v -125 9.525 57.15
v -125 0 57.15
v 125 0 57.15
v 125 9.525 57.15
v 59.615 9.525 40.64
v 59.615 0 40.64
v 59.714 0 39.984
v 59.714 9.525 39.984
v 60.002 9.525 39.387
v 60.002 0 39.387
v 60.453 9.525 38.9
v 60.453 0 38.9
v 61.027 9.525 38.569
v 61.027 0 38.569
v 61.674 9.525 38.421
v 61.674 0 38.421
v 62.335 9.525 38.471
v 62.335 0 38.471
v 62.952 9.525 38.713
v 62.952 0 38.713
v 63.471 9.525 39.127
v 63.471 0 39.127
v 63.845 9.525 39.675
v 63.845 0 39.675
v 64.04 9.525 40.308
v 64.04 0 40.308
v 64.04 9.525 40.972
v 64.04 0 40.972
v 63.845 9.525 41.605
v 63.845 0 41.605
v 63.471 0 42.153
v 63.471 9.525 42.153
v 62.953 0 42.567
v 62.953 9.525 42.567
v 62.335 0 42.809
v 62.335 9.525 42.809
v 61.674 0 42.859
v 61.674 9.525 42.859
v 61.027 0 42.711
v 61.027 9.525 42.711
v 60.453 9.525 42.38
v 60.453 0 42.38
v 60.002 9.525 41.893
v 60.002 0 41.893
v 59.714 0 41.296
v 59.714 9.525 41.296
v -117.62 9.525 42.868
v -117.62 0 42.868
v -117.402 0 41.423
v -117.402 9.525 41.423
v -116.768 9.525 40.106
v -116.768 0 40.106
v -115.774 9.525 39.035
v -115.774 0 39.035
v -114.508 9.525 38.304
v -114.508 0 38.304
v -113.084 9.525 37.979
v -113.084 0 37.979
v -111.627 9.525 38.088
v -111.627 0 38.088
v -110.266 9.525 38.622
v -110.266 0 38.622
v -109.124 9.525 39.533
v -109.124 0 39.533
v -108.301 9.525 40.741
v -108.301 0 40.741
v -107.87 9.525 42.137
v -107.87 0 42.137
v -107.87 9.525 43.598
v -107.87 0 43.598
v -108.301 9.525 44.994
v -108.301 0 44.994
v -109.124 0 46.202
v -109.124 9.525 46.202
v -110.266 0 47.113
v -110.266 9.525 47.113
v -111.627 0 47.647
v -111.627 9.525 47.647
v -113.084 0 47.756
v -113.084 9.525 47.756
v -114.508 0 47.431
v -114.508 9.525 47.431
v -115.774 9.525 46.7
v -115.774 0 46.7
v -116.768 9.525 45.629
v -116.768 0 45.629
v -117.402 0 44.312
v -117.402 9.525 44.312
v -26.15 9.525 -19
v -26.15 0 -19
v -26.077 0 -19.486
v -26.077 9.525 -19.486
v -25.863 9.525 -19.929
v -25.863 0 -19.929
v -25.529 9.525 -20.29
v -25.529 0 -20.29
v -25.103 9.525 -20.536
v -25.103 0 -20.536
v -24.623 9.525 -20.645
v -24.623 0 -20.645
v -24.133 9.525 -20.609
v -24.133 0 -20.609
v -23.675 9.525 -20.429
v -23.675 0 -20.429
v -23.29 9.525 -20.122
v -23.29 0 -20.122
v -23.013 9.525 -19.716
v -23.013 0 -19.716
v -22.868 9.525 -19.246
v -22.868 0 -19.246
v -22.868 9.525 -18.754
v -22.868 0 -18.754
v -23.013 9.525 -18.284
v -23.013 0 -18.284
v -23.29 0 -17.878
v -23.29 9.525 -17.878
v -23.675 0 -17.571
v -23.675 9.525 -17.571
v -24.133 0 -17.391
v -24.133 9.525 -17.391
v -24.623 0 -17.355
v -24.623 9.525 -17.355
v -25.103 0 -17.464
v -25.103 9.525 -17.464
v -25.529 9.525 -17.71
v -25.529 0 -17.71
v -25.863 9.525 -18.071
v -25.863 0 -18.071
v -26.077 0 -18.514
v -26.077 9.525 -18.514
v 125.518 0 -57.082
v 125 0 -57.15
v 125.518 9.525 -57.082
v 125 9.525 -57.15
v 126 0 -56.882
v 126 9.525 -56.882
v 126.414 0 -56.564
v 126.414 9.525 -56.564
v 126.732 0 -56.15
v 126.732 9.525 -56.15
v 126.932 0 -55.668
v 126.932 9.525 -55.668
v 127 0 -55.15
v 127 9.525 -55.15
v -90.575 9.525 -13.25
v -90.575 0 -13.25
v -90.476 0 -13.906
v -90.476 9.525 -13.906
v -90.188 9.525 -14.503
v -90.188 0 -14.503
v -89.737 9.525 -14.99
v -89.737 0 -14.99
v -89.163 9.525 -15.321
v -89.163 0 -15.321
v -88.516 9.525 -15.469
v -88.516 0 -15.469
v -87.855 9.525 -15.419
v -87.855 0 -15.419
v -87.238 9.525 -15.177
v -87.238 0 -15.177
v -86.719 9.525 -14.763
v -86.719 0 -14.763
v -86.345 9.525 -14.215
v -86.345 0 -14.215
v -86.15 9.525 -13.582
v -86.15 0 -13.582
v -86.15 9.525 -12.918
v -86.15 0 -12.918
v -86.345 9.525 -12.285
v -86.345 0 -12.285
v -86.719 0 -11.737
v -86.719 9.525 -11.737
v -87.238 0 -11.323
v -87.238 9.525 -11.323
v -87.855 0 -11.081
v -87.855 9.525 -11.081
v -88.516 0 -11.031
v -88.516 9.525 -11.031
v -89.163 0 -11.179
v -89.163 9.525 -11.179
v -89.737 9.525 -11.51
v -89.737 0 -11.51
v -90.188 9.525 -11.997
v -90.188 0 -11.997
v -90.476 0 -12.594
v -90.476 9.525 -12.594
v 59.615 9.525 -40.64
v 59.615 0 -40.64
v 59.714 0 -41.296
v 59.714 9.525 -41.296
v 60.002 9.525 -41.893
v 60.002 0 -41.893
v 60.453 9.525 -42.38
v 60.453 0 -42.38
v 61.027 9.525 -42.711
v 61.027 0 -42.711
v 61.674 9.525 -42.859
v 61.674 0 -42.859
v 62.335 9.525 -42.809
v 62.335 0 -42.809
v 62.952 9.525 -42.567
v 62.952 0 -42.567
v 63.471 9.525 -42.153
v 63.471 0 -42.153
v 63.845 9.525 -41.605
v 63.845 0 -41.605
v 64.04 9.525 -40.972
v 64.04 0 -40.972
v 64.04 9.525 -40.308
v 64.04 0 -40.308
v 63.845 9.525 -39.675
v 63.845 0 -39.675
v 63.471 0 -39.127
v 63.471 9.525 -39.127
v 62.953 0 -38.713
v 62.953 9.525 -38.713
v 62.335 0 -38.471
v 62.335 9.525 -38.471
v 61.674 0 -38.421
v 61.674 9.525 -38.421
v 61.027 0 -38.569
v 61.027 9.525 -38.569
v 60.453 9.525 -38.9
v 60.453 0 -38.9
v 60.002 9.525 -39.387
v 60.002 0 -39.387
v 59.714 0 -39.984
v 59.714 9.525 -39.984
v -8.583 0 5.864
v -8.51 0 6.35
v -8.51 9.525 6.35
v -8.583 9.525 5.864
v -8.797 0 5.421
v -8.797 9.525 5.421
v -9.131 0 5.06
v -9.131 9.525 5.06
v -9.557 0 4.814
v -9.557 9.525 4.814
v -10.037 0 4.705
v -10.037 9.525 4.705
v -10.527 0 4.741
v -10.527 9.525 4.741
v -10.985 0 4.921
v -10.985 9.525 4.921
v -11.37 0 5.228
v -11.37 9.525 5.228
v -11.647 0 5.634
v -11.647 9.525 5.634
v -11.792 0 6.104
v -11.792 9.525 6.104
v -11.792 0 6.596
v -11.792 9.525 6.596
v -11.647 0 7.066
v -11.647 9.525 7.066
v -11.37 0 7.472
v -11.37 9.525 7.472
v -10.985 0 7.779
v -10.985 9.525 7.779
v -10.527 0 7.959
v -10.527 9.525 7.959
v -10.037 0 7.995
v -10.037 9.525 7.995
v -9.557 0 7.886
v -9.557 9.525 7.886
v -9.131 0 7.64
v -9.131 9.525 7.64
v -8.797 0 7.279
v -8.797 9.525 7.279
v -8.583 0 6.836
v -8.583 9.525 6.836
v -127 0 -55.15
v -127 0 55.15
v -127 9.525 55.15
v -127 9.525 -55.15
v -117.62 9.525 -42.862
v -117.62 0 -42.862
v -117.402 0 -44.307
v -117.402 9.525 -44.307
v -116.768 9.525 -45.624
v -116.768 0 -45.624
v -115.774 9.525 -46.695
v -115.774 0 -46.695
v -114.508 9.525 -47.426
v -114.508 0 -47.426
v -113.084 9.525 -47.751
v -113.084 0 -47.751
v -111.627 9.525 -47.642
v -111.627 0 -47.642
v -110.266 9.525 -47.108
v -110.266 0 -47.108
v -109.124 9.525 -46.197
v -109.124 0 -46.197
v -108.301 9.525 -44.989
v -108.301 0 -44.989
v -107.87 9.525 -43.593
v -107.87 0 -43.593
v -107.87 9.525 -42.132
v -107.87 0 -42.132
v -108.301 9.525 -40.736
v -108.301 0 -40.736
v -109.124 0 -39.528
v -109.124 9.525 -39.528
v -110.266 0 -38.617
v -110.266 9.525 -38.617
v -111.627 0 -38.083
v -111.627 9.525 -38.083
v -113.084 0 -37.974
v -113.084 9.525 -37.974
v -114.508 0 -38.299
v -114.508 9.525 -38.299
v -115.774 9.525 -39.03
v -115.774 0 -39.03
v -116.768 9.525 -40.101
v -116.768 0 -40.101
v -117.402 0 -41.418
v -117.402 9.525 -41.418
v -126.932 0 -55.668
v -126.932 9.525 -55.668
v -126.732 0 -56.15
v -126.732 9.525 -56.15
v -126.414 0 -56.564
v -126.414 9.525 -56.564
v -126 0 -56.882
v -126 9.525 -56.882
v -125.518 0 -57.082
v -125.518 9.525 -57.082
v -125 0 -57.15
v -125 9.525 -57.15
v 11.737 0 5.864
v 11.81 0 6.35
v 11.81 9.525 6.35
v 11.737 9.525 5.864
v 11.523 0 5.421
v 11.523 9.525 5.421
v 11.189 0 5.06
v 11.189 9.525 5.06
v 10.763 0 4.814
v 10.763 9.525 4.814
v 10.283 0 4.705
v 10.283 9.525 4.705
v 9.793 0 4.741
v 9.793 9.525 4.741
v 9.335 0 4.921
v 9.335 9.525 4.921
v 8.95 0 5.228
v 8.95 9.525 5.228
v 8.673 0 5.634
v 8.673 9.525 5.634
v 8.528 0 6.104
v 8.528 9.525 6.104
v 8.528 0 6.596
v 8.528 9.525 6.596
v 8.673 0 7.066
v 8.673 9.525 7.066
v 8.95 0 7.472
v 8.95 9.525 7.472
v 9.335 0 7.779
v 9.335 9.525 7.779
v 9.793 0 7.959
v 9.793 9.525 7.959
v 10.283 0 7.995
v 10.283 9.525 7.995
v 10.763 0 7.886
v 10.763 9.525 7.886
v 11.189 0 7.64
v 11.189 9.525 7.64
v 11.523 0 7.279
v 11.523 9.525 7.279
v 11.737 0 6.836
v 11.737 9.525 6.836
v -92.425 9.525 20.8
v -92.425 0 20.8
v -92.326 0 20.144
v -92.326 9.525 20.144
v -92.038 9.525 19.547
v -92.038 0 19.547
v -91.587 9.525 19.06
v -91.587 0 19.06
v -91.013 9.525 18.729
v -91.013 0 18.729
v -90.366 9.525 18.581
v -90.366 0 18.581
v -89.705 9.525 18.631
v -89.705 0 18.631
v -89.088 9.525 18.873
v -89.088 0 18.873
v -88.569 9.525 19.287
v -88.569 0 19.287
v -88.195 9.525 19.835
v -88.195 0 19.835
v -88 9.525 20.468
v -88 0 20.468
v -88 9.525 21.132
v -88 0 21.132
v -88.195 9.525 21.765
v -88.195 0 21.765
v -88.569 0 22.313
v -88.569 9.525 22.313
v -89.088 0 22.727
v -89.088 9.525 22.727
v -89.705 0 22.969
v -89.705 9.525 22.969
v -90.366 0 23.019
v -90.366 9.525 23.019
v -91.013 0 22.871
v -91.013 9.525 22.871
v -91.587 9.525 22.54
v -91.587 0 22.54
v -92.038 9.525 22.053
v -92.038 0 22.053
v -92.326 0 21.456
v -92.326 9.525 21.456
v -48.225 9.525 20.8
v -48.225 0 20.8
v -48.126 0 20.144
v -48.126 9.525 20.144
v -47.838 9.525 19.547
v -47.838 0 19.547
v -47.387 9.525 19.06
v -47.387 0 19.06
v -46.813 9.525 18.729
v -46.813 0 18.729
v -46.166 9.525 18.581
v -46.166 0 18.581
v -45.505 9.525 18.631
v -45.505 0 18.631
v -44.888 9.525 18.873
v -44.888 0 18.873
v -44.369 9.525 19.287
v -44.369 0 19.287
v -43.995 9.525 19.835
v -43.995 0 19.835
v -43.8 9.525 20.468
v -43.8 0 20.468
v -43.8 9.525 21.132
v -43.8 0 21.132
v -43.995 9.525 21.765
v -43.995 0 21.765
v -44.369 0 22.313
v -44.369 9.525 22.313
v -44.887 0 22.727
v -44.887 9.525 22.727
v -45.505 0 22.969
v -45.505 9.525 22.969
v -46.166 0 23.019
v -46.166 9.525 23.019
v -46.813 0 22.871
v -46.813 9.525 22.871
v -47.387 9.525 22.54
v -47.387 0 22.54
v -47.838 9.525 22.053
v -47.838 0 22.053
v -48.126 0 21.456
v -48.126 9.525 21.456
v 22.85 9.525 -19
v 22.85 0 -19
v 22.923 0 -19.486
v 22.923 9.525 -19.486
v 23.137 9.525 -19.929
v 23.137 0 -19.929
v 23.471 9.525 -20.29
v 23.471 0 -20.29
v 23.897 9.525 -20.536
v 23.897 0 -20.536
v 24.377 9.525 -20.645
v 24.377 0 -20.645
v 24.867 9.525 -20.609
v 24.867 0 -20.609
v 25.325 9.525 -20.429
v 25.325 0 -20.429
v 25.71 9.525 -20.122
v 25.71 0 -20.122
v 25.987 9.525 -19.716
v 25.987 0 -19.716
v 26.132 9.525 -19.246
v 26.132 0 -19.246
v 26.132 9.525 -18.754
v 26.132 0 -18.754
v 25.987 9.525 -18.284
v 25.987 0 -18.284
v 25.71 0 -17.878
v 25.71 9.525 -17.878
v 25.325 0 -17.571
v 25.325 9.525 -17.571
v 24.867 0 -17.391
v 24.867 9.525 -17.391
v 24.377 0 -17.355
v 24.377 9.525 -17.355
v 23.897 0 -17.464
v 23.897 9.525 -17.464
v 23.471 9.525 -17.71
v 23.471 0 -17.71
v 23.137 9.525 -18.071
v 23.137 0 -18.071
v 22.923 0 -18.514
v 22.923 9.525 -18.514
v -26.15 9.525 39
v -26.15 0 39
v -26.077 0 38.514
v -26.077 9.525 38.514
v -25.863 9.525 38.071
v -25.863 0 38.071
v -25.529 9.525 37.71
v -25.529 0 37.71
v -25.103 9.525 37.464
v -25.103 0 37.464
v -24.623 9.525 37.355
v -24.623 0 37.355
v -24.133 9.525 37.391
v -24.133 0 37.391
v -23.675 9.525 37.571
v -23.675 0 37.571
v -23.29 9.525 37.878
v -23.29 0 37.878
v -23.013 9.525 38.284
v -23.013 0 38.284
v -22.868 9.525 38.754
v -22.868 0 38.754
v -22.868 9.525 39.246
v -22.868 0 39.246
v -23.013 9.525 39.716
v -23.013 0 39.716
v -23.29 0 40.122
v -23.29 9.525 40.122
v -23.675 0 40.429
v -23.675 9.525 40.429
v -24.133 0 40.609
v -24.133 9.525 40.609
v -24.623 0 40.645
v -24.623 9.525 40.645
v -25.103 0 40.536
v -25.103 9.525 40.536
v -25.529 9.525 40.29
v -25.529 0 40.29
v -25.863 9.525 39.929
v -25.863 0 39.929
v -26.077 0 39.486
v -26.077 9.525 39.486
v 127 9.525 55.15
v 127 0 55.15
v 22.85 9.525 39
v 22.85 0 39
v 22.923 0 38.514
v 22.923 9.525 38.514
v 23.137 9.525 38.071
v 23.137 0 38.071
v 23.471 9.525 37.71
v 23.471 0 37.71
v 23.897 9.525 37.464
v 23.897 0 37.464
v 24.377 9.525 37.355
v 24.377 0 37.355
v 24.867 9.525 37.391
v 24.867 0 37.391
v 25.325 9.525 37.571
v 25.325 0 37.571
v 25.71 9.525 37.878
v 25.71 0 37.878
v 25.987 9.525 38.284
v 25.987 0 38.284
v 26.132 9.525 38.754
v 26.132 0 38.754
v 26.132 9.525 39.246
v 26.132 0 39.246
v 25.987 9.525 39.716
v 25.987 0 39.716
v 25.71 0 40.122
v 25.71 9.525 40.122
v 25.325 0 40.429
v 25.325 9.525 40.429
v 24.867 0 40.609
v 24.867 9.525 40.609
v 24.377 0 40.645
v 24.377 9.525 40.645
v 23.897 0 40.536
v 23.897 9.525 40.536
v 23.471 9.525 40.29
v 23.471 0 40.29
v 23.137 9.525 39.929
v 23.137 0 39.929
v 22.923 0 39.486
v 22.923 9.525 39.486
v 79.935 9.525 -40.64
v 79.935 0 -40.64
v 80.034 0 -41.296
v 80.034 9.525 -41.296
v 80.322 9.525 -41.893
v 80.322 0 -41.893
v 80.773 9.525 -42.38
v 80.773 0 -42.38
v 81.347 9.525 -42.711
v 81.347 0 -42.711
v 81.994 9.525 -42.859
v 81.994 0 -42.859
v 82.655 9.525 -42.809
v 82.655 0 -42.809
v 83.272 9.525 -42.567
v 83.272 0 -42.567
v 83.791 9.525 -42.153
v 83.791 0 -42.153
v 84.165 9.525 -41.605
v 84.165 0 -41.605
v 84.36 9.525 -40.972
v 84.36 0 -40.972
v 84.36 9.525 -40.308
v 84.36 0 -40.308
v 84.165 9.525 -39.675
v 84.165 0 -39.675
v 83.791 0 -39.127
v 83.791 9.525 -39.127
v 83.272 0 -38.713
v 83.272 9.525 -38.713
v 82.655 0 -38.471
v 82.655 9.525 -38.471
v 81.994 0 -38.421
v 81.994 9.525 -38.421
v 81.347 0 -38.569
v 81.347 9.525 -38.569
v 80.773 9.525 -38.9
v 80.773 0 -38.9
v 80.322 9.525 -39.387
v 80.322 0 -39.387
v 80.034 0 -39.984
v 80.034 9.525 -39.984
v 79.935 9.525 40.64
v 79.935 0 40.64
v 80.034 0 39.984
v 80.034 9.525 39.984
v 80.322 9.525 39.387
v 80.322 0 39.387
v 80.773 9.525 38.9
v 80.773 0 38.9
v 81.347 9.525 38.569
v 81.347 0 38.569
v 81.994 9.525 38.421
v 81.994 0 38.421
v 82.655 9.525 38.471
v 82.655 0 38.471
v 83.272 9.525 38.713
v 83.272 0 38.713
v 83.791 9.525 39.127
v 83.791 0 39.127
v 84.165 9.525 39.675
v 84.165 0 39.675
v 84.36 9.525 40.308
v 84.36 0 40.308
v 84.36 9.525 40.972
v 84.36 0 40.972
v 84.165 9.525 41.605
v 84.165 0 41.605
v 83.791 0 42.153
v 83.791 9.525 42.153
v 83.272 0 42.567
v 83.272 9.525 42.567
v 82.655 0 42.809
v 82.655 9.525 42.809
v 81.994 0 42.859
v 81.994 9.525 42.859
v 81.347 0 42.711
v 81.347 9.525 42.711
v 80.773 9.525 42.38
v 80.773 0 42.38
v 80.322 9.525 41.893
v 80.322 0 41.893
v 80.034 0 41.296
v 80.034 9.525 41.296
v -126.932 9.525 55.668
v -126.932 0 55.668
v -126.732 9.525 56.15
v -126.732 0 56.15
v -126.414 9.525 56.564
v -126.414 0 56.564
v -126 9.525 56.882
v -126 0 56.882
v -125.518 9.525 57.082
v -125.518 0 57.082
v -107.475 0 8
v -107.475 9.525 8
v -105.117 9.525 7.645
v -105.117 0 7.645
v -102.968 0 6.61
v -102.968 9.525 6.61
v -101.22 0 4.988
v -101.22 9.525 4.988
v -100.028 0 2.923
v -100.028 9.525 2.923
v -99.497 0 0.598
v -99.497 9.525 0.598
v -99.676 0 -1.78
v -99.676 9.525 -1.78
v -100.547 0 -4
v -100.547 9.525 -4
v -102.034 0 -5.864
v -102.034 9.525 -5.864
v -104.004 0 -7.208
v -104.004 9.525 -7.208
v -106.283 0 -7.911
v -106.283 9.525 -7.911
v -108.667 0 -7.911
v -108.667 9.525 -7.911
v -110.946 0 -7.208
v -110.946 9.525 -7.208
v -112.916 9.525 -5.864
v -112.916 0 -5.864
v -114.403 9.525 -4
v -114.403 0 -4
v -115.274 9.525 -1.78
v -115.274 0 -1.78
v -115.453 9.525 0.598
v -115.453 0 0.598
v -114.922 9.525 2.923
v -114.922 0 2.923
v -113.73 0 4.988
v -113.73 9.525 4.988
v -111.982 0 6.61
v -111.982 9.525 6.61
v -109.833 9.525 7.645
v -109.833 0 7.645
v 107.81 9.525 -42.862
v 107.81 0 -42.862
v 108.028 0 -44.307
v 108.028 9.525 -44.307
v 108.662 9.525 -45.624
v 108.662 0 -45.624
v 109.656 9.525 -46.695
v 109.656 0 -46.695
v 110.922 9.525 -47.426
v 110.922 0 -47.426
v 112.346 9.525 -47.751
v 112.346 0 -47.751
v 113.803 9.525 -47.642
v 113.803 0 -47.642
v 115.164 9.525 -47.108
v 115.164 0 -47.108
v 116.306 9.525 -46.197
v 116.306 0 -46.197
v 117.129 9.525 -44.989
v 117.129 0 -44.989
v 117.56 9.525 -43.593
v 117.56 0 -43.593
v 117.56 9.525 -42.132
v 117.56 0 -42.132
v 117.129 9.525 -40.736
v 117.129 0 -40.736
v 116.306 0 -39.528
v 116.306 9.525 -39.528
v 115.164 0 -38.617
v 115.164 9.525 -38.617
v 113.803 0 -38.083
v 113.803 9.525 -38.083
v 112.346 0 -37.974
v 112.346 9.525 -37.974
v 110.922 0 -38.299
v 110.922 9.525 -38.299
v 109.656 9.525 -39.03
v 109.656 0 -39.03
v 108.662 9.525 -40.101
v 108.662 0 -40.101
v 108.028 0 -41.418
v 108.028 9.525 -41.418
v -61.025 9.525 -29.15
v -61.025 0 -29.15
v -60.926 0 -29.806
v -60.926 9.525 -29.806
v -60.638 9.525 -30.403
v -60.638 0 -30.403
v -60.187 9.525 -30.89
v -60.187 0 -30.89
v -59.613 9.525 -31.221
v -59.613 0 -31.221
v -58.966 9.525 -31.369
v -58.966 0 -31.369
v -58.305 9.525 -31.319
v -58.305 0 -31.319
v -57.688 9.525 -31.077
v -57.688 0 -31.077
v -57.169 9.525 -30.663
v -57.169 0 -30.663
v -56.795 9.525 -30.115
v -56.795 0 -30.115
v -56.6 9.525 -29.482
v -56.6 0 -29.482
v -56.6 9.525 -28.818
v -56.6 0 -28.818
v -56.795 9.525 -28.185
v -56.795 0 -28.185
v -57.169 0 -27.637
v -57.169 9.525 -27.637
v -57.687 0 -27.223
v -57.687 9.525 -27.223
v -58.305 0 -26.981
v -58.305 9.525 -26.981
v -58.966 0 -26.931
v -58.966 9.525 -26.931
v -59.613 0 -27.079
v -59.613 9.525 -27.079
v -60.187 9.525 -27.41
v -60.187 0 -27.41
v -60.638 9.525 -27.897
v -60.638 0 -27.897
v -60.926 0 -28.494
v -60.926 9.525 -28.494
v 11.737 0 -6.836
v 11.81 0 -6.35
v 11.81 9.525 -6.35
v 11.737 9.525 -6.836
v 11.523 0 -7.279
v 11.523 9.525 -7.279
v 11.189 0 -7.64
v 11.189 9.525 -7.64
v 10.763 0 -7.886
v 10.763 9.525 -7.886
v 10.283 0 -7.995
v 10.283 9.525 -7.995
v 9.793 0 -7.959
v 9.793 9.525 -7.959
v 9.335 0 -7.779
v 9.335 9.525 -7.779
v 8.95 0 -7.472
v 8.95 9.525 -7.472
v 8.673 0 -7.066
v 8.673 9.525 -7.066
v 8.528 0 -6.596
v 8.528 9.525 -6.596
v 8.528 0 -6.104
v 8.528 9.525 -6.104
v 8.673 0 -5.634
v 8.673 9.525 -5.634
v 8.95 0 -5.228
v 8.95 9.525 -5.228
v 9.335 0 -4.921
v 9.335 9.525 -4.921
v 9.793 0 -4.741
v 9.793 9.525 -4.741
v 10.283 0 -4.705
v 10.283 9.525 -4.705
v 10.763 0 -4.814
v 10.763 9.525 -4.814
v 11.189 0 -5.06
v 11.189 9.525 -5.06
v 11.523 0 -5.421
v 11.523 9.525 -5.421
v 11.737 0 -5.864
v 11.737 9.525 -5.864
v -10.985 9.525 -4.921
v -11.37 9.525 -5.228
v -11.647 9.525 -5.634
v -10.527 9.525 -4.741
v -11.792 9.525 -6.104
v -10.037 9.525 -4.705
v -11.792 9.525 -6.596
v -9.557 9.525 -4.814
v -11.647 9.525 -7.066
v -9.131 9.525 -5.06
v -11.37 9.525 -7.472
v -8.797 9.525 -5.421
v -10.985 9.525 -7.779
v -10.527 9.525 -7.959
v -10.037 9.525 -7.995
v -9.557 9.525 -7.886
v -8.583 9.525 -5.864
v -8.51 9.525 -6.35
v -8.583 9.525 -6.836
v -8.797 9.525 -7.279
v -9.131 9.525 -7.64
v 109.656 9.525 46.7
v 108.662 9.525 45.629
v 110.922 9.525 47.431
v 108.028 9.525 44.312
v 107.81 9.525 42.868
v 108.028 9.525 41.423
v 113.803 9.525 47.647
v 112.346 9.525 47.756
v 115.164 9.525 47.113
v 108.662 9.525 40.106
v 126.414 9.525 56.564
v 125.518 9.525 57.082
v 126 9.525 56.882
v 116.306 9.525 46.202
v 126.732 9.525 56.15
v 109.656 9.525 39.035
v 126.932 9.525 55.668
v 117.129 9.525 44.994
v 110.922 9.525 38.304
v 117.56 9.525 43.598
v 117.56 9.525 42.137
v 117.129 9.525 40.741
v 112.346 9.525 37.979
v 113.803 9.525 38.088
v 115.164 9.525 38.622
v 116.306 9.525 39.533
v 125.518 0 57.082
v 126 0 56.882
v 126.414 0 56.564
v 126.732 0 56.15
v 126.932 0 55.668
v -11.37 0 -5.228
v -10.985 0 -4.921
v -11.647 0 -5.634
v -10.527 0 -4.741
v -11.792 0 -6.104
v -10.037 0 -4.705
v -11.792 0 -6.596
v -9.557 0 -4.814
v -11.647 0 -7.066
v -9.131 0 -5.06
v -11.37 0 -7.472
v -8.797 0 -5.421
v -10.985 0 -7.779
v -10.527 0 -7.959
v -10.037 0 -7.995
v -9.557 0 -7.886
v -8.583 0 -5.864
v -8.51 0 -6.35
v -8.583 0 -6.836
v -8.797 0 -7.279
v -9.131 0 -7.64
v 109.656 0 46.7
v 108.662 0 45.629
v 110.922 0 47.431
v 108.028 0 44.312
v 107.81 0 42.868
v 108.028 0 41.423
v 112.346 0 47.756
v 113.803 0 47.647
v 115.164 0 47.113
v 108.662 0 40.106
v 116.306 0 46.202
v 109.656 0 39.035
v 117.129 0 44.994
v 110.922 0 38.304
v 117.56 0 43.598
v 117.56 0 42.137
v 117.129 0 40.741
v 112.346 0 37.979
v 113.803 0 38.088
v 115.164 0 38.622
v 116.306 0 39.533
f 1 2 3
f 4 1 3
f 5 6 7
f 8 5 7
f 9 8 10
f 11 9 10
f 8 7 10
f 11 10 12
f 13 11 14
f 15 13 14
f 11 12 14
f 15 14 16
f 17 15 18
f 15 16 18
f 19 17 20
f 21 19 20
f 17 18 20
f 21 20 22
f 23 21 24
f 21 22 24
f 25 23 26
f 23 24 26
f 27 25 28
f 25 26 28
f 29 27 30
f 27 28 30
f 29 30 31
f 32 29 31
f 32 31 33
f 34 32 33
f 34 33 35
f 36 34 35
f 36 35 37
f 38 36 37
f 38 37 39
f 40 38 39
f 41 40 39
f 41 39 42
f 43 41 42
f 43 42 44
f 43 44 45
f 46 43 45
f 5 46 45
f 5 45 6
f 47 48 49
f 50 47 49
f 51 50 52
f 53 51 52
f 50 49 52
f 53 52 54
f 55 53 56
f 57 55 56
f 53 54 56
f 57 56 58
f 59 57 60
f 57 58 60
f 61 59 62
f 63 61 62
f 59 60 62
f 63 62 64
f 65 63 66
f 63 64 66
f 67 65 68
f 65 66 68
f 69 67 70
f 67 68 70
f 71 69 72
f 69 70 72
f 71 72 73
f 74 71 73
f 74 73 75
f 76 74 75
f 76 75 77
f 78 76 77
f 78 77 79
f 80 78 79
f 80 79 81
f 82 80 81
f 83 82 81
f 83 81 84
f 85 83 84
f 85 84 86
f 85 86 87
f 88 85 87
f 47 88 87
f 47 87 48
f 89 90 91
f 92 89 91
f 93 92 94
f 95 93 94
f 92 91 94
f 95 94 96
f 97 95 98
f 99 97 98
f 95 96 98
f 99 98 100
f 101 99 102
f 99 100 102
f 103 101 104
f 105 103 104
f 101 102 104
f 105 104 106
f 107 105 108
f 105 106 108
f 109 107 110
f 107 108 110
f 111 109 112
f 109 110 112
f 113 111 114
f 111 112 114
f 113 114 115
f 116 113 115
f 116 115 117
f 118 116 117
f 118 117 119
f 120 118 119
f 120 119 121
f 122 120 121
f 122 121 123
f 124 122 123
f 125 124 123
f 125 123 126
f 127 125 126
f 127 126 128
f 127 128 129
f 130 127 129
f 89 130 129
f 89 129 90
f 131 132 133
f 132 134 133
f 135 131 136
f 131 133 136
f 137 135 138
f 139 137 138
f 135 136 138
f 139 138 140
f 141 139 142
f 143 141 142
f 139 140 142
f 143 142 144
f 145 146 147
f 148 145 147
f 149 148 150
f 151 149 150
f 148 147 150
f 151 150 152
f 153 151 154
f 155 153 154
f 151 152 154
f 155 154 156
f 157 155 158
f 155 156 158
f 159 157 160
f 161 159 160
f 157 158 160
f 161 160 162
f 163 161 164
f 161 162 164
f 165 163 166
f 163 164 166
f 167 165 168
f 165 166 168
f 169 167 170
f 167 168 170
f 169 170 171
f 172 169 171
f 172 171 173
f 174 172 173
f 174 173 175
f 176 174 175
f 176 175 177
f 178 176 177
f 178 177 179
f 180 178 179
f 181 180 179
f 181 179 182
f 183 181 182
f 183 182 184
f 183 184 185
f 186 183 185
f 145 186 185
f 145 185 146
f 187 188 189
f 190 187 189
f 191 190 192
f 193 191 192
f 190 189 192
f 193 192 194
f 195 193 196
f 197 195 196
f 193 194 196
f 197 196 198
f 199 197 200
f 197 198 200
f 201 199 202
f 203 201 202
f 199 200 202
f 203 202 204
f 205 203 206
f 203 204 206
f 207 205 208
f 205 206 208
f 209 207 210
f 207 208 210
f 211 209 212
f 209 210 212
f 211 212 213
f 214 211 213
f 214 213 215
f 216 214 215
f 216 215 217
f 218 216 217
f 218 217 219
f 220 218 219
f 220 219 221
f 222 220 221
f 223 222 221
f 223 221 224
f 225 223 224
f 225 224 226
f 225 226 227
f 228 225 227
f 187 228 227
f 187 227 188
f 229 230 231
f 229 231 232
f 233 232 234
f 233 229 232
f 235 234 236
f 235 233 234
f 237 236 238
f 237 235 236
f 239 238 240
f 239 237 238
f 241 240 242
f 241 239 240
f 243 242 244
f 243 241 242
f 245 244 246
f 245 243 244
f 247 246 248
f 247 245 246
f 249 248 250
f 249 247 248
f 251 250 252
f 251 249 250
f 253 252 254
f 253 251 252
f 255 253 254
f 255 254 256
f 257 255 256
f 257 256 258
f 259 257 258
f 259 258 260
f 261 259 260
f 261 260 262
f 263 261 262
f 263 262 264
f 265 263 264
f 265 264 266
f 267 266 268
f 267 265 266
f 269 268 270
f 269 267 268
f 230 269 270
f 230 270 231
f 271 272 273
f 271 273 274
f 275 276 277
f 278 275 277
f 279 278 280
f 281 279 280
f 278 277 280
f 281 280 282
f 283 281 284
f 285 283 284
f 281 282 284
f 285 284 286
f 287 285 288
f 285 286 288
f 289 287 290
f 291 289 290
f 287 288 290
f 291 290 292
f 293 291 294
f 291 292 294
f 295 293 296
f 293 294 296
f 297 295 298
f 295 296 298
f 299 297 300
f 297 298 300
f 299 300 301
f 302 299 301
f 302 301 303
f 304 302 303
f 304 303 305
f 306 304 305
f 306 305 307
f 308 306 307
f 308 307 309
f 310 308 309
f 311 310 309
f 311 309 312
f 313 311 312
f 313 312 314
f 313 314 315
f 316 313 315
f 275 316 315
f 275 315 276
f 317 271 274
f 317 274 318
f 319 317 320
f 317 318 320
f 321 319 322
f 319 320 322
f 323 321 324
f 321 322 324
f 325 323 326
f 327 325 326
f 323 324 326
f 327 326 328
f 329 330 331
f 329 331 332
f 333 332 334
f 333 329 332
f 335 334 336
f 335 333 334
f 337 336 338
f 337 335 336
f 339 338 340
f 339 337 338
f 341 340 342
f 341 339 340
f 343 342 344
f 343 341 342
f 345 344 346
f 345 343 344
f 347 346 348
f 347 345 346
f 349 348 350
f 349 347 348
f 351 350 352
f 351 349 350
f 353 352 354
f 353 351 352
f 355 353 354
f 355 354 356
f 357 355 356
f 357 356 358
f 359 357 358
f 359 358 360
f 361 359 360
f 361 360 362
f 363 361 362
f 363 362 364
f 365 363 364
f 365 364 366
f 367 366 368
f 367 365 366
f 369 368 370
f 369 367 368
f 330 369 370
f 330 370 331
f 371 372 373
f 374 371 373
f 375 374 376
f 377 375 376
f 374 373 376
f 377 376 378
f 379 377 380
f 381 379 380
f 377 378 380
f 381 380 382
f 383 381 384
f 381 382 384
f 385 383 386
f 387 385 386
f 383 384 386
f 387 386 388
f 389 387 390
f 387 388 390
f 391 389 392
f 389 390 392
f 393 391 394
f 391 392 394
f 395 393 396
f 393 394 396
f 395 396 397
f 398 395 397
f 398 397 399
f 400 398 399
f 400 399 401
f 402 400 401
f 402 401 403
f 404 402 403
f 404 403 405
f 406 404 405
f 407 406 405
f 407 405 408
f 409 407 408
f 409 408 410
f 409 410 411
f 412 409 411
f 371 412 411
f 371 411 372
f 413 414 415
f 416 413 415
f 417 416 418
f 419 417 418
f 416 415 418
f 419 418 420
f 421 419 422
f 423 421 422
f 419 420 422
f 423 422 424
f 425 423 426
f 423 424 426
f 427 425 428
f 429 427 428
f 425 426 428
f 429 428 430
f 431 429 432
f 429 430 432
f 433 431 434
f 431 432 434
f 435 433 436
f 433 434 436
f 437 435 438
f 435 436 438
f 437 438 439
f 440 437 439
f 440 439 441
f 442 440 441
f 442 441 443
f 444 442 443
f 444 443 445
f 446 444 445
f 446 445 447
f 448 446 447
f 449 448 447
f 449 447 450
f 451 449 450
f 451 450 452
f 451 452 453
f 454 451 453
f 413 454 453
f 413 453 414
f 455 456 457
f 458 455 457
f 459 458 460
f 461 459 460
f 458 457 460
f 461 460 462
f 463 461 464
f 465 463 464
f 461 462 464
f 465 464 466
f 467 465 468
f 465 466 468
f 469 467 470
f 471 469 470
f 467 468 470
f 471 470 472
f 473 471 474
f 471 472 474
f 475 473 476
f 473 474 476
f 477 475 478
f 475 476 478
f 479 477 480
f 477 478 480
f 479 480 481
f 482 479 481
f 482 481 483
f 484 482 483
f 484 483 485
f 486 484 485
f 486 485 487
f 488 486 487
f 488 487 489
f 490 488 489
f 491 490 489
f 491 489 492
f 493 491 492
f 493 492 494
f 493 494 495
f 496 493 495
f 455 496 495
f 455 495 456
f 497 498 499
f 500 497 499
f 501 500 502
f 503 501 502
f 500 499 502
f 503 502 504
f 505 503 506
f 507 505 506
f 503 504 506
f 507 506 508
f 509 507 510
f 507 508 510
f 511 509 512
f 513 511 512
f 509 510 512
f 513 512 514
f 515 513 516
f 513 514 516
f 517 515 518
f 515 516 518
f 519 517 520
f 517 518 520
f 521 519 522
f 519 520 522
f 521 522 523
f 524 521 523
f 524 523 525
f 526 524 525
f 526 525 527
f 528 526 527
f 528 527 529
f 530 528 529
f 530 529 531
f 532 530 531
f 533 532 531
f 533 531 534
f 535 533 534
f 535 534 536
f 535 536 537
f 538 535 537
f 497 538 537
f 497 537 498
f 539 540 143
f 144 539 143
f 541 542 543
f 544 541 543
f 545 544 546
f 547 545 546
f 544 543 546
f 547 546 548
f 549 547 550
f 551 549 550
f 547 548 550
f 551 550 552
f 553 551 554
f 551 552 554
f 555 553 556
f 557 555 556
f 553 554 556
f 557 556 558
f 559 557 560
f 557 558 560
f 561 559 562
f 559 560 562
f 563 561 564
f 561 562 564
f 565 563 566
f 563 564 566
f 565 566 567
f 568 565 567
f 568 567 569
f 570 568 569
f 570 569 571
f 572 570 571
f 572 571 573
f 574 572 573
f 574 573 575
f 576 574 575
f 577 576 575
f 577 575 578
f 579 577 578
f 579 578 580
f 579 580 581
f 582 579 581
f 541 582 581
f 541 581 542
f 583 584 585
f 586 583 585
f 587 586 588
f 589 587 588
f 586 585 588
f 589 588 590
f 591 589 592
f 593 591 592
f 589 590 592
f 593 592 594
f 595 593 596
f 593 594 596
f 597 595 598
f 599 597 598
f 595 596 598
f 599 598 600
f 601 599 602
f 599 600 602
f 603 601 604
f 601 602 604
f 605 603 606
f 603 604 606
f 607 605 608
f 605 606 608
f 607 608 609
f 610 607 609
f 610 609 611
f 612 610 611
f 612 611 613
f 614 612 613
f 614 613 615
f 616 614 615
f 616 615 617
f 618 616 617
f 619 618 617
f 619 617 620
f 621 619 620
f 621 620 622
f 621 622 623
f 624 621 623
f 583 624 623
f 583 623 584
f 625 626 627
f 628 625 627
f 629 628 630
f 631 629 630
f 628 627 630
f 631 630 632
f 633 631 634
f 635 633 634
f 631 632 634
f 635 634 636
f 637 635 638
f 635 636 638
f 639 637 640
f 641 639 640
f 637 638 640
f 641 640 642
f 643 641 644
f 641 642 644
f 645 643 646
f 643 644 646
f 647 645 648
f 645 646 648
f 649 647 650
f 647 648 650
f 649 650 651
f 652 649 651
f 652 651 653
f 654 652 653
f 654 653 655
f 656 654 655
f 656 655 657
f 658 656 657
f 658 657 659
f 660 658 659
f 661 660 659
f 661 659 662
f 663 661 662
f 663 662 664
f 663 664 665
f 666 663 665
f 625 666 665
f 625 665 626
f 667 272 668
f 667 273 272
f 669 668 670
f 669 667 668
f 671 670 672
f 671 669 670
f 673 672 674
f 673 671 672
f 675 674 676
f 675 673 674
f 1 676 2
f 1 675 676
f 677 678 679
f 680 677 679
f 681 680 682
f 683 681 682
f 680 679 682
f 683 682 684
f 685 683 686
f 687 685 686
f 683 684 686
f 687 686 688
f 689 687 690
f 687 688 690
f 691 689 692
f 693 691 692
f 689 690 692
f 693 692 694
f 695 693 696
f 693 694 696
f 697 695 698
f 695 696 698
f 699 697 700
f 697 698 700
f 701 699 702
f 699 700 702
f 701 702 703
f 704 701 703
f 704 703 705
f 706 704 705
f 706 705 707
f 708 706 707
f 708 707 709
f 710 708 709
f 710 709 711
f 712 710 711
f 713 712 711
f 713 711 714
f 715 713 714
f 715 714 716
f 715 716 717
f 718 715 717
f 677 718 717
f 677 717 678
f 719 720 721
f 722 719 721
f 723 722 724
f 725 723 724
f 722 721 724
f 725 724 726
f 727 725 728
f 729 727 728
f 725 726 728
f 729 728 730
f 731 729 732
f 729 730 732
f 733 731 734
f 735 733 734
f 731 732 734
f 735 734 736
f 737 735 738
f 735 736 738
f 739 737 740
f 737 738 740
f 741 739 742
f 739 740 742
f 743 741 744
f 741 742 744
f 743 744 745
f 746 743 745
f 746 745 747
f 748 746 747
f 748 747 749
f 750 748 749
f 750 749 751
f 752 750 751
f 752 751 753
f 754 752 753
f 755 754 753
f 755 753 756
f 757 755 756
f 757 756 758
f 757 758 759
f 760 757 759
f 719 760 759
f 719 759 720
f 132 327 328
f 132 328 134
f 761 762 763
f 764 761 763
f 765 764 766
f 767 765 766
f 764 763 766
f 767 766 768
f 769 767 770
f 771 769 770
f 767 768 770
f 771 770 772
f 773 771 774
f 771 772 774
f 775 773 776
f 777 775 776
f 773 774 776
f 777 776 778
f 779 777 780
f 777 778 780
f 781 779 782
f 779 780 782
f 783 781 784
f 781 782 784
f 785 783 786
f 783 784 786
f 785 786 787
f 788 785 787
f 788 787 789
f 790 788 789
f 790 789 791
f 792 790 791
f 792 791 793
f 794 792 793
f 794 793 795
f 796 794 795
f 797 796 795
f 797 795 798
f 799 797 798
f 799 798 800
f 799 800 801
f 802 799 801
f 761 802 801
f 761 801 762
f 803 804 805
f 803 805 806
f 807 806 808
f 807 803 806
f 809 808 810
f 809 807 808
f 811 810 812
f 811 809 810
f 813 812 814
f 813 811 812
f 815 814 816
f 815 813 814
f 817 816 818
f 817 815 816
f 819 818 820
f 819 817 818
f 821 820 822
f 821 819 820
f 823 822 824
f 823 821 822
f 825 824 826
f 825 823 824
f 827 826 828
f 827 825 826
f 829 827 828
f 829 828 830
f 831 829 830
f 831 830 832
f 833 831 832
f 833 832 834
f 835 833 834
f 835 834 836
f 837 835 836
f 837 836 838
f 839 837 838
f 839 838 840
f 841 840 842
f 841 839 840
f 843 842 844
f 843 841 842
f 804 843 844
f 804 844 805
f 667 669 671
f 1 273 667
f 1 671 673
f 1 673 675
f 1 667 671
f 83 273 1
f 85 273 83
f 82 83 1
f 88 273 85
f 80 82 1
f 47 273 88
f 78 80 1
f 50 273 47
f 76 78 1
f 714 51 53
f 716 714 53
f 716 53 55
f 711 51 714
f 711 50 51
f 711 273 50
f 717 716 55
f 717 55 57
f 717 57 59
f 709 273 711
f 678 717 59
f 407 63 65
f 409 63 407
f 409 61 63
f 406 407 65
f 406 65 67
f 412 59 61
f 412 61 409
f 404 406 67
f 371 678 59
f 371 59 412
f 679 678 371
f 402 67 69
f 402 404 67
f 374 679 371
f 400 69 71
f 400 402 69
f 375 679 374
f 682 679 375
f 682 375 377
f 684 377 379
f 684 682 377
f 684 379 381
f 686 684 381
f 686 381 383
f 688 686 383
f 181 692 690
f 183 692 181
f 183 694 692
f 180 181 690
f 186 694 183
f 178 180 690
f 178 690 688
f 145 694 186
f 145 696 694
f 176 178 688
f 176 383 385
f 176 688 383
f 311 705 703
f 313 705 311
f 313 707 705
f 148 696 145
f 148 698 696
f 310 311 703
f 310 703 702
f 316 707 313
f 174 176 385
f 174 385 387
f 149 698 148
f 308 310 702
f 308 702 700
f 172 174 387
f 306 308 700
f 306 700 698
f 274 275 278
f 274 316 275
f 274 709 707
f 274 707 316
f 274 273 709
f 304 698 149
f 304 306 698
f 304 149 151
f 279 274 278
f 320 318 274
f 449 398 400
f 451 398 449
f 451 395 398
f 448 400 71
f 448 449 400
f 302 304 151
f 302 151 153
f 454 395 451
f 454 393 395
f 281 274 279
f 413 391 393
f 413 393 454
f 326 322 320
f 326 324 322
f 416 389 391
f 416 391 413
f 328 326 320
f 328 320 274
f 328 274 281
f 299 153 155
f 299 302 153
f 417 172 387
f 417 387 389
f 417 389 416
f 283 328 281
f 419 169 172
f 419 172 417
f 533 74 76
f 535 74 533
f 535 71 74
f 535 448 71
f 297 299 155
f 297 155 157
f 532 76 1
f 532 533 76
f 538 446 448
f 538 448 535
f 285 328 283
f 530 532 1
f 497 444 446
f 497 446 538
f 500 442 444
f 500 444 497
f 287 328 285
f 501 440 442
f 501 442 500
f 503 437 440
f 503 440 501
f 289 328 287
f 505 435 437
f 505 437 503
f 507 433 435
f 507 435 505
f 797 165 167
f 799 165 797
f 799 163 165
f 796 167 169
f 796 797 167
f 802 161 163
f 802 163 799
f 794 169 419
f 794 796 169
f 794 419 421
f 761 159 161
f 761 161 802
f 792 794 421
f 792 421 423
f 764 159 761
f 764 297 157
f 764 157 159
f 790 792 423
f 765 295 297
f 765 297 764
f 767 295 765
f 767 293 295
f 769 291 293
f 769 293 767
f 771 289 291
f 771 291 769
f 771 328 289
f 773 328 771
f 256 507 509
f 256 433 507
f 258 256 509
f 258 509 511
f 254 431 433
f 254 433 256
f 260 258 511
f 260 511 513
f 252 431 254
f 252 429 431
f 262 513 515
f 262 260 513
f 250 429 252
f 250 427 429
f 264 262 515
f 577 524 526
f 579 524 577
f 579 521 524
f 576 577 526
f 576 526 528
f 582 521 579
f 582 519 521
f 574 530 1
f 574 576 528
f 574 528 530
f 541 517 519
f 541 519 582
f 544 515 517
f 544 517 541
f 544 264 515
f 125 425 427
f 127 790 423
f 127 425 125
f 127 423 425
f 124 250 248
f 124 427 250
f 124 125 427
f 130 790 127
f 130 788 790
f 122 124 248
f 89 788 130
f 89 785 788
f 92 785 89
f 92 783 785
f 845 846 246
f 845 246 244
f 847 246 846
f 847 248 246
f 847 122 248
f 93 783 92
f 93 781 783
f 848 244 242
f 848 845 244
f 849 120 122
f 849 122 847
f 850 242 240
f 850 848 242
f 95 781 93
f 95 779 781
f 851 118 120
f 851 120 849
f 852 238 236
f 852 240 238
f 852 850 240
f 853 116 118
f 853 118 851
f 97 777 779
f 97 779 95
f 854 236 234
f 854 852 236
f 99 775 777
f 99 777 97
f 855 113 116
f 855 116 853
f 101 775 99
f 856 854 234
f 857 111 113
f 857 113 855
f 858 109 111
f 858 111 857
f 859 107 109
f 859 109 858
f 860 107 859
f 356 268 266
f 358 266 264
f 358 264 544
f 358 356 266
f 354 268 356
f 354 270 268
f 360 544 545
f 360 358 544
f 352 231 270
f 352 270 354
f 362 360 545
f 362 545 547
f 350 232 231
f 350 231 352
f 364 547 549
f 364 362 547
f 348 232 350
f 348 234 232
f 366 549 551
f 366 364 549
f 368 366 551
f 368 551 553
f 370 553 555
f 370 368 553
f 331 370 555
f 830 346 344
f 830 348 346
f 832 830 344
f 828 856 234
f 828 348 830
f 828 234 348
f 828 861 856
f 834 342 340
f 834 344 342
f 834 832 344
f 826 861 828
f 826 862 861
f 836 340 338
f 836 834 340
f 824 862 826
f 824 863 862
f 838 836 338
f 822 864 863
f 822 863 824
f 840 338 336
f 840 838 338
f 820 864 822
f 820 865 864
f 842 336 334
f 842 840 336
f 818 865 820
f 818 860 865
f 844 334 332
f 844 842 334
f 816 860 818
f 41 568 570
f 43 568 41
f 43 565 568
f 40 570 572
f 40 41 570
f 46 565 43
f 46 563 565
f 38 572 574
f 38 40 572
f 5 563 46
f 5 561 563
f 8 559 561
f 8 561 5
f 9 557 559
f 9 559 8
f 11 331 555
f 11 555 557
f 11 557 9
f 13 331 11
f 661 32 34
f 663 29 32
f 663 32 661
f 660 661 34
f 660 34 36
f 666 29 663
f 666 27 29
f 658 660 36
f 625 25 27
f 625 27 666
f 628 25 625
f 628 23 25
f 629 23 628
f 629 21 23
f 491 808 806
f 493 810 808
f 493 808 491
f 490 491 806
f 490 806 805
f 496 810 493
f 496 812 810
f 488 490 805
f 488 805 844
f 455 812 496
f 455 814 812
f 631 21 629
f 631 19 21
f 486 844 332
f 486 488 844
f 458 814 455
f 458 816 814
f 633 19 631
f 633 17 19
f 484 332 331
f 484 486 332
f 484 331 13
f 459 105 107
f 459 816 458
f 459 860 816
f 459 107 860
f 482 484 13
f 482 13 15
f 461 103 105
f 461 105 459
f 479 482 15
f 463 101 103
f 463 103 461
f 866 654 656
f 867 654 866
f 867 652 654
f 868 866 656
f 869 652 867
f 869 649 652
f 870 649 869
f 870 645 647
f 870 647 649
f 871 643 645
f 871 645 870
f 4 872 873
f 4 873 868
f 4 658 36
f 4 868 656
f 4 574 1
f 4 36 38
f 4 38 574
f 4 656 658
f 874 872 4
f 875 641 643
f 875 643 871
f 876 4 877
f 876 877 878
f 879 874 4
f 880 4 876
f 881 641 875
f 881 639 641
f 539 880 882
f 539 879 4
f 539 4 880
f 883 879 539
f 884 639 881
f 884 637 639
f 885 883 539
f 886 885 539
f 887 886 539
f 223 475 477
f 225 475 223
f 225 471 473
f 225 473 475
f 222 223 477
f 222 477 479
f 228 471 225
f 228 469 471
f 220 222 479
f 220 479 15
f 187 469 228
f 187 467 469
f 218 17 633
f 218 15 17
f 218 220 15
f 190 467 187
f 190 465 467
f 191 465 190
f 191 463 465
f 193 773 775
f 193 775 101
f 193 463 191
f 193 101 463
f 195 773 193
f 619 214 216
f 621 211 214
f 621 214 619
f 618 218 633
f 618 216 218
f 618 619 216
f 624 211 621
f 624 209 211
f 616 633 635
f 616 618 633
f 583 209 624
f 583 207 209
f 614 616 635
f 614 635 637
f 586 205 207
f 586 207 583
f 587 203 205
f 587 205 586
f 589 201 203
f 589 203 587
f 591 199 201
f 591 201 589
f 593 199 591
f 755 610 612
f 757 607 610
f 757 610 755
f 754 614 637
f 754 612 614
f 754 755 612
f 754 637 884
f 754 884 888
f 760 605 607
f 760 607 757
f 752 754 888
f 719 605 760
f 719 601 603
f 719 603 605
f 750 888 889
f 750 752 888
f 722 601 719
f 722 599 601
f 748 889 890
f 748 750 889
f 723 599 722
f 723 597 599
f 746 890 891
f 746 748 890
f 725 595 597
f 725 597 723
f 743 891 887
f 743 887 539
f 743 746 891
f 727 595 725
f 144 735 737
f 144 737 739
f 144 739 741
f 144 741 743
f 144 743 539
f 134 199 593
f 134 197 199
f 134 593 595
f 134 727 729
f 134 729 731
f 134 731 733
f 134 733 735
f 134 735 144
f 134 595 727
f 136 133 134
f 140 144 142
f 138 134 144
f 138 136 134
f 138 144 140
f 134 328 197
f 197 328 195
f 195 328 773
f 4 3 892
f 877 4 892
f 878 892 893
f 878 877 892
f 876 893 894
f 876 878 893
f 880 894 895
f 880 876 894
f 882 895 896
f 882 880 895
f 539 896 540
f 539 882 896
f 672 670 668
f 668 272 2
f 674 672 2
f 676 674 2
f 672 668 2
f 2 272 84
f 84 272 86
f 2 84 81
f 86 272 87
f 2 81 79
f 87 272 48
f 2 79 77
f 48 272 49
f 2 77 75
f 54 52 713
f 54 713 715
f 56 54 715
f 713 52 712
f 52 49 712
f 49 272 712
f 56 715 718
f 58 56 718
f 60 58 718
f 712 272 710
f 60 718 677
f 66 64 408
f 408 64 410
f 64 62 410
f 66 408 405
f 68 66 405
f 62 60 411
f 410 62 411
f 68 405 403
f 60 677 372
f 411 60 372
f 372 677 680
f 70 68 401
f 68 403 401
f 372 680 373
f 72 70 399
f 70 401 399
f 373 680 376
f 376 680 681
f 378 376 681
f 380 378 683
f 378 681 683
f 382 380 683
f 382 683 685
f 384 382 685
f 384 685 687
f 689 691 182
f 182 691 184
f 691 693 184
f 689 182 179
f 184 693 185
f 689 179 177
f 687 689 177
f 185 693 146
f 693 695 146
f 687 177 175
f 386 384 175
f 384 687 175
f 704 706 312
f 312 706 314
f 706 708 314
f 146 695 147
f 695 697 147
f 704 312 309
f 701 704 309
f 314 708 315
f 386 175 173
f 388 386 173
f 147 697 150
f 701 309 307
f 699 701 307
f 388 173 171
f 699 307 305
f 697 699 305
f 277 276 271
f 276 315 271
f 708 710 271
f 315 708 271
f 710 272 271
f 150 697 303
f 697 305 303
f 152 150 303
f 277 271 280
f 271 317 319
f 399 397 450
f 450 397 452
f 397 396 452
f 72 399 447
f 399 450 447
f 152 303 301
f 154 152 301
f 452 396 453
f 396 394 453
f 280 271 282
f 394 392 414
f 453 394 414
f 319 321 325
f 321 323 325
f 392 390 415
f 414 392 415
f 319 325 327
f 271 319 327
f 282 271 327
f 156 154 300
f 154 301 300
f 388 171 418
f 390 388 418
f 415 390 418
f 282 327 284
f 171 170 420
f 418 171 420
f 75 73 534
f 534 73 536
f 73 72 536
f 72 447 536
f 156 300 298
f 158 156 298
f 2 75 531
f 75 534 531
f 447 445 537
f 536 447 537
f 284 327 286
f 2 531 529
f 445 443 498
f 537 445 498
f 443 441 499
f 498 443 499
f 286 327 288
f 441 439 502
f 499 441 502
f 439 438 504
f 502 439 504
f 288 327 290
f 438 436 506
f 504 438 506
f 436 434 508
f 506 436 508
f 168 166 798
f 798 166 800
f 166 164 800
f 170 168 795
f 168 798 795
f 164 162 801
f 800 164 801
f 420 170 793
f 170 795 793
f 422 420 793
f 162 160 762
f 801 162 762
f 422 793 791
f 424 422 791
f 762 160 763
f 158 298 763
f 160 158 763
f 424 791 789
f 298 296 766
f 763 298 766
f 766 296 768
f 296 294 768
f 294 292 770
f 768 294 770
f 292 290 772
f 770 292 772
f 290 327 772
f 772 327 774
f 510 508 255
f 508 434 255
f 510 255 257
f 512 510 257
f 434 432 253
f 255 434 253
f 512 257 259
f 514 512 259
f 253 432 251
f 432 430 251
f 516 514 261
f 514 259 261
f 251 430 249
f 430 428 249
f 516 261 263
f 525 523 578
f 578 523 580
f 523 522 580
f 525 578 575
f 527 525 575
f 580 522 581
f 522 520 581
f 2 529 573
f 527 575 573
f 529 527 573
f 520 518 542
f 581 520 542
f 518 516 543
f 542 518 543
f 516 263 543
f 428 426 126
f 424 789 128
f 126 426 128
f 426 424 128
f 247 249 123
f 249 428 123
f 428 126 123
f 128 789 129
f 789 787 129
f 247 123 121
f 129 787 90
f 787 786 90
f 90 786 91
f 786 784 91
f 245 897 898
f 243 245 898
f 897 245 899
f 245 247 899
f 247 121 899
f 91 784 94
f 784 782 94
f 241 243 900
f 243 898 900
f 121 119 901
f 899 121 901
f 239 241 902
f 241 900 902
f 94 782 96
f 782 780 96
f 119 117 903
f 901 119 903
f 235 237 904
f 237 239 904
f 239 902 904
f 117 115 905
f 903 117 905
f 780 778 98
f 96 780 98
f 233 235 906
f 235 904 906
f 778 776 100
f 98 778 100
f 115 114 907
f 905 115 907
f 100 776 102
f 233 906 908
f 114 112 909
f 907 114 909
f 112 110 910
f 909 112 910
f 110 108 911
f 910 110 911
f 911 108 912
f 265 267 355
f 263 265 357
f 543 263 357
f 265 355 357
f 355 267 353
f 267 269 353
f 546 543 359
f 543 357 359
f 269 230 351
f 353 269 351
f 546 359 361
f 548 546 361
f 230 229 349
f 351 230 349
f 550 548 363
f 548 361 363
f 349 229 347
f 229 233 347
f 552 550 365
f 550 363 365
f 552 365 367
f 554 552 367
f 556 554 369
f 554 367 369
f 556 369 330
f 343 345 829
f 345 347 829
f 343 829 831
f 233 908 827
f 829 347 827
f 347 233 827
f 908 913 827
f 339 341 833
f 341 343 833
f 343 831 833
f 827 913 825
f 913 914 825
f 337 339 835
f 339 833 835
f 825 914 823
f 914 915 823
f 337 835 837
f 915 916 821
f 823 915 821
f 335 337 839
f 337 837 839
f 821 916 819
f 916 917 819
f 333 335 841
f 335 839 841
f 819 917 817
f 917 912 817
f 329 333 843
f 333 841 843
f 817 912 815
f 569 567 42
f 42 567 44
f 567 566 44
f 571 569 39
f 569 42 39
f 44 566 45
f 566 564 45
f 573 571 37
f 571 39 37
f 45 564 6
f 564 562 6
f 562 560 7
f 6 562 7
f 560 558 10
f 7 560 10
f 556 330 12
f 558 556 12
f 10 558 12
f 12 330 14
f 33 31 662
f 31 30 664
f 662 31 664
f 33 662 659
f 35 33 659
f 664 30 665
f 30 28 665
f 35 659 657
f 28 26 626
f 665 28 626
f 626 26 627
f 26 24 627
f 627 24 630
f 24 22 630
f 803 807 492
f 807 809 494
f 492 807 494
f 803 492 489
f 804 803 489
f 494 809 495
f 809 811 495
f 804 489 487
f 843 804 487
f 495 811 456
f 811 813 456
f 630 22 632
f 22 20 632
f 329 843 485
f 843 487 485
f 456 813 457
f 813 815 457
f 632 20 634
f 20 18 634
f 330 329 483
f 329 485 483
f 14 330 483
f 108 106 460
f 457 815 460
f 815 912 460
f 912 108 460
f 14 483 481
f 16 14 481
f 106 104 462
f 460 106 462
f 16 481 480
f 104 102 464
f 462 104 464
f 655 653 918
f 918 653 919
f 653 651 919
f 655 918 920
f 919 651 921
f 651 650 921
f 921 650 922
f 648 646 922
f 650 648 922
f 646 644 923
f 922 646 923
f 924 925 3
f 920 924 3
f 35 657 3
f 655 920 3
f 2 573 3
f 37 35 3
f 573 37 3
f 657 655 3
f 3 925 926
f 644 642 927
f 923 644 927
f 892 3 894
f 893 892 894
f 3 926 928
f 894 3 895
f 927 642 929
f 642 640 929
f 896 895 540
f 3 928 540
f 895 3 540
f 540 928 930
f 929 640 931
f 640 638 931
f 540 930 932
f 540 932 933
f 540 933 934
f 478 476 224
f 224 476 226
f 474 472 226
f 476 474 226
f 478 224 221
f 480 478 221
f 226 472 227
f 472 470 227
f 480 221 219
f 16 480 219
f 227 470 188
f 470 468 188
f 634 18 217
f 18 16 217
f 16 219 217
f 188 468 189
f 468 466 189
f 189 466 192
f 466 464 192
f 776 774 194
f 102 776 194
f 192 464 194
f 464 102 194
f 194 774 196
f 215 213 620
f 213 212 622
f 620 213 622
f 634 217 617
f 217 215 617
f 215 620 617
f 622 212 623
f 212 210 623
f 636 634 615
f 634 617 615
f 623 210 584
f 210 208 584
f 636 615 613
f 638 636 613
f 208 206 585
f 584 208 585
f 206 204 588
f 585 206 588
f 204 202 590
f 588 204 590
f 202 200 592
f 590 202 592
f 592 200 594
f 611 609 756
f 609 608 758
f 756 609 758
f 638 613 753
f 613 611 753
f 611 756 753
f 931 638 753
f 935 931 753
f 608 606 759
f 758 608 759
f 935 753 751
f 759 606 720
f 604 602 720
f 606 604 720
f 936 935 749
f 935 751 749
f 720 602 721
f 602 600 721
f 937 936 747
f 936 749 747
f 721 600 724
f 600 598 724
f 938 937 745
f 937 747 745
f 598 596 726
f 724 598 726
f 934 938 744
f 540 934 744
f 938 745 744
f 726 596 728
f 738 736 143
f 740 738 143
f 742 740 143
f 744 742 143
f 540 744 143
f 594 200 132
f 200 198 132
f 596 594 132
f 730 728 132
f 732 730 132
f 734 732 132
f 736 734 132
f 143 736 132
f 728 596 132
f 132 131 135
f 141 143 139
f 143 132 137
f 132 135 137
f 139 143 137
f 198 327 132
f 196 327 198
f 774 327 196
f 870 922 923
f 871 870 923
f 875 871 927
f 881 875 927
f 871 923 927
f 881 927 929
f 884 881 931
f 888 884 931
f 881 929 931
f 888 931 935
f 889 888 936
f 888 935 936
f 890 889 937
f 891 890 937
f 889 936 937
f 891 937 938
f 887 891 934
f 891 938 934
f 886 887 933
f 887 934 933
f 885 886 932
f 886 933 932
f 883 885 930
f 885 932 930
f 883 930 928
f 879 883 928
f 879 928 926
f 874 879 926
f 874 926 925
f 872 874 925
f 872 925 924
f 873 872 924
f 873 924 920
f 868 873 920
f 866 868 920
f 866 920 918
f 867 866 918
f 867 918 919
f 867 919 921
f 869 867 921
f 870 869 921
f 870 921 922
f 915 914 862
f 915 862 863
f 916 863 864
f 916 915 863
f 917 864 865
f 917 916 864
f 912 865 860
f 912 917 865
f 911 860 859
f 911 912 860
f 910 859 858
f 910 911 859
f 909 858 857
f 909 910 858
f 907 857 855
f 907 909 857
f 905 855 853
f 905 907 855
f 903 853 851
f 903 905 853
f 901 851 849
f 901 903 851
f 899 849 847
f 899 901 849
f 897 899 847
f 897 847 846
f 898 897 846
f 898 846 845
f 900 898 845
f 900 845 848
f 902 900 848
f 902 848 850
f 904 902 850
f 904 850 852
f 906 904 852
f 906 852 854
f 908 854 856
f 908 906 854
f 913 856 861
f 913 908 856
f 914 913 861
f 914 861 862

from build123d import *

# Parameters (mm, degrees)
SKETCH1_W                      = 254
SKETCH1_H                      = 114.3
BOSS_EXTRUDE1_DEPTH            = 9.525
F_3_8_CLEARANCE_HOLE1_D        = 9.8044
F_3_8_CLEARANCE_HOLE1_DEPTH    = 10
F_3_8_CLEARANCE_HOLE1_TIP      = 2.945538927
M2_5_CLEARANCE_HOLE3_D         = 3.3
M2_5_CLEARANCE_HOLE3_DEPTH     = 10
M2_5_CLEARANCE_HOLE3_TIP       = 0.991420021
FILLET1_R                      = 2
M3_CLEARANCE_HOLE4_D           = 4.45
M3_CLEARANCE_HOLE4_DEPTH       = 10
M3_CLEARANCE_HOLE4_TIP         = 1.336914877
SKETCH22_R                     = 8
CUT_EXTRUDE1_DEPTH             = 140.5917194
M3_CLEARANCE_HOLE5_D           = 4.45
M3_CLEARANCE_HOLE5_DEPTH       = 10
M3_CLEARANCE_HOLE5_TIP         = 1.336914877
M2_5_CLEARANCE_HOLE4_OUTLINE_R = 1.65
M2_5_CLEARANCE_HOLE4_DEPTH     = 9.525


# Read off the part's stored shape, not the designer's step: M2.5 Clearance Hole4
with BuildPart() as part:
    # Sketch1 → Boss-Extrude1 (new body)
    with BuildSketch(Plane(origin=(0, 0, 0), x_dir=(1, 0, 0), z_dir=(0, 1, 0))):
        Rectangle(SKETCH1_W, SKETCH1_H)
    extrude(amount=BOSS_EXTRUDE1_DEPTH)

    # 3/8 Clearance Hole1
    with Locations(Plane(origin=(0, 9.525, 0), x_dir=(1, 0, 0), z_dir=(0, 1, 0))):
        with Locations((112.7125, 42.8625), (112.7125, -42.8675), (-112.7175, 42.8625), (-112.7175, -42.8675)):
            Hole(F_3_8_CLEARANCE_HOLE1_D / 2, depth=F_3_8_CLEARANCE_HOLE1_DEPTH)
            with Locations((0, 0, -(F_3_8_CLEARANCE_HOLE1_DEPTH + F_3_8_CLEARANCE_HOLE1_TIP / 2))):  # 118° drill point
                Cone(0, F_3_8_CLEARANCE_HOLE1_D / 2, F_3_8_CLEARANCE_HOLE1_TIP, mode=Mode.SUBTRACT)

    # M2.5 Clearance Hole3
    with Locations(Plane(origin=(0, 9.525, 0), x_dir=(1, 0, 0), z_dir=(0, 1, 0))):
        with Locations((24.5, 19), (-24.5, -39), (24.5, -39), (-24.5, 19)):
            Hole(M2_5_CLEARANCE_HOLE3_D / 2, depth=M2_5_CLEARANCE_HOLE3_DEPTH)
            with Locations((0, 0, -(M2_5_CLEARANCE_HOLE3_DEPTH + M2_5_CLEARANCE_HOLE3_TIP / 2))):  # 118° drill point
                Cone(0, M2_5_CLEARANCE_HOLE3_D / 2, M2_5_CLEARANCE_HOLE3_TIP, mode=Mode.SUBTRACT)

    # Fillet1
    fillet1_edges = [part.edges().sort_by_distance(p)[0] for p in [
        (127, 4.7625, 57.15),
        (-127, 4.7625, 57.15),
        (-127, 4.7625, -57.15),
        (127, 4.7625, -57.15),
    ]]
    fillet(fillet1_edges, radius=FILLET1_R)

    # M3 Clearance Hole4
    with Locations(Plane(origin=(0, 9.525, 0), x_dir=(1, 0, 0), z_dir=(0, 1, 0))):
        with Locations((-58.8, 29.15), (-46, -20.8), (-90.2, -20.8), (-88.35, 13.25)):
            Hole(M3_CLEARANCE_HOLE4_D / 2, depth=M3_CLEARANCE_HOLE4_DEPTH)
            with Locations((0, 0, -(M3_CLEARANCE_HOLE4_DEPTH + M3_CLEARANCE_HOLE4_TIP / 2))):  # 118° drill point
                Cone(0, M3_CLEARANCE_HOLE4_D / 2, M3_CLEARANCE_HOLE4_TIP, mode=Mode.SUBTRACT)

    # Sketch22 → Cut-Extrude1 (cut, through all)
    with BuildSketch(Plane(origin=(0, 9.525, 0), x_dir=(1, 0, 0), z_dir=(0, 1, 0))):
        with Locations(Location((-107.475, 0, 0), (0, 0, 270))):
            Circle(SKETCH22_R)
    extrude(amount=-CUT_EXTRUDE1_DEPTH, mode=Mode.SUBTRACT)

    # M3 Clearance Hole5
    with Locations(Plane(origin=(0, 9.525, 0), x_dir=(1, 0, 0), z_dir=(0, 1, 0))):
        with Locations((61.84, 40.64), (61.84, -40.64), (82.16, -40.64), (82.16, 40.64)):
            Hole(M3_CLEARANCE_HOLE5_D / 2, depth=M3_CLEARANCE_HOLE5_DEPTH)
            with Locations((0, 0, -(M3_CLEARANCE_HOLE5_DEPTH + M3_CLEARANCE_HOLE5_TIP / 2))):  # 118° drill point
                Cone(0, M3_CLEARANCE_HOLE5_D / 2, M3_CLEARANCE_HOLE5_TIP, mode=Mode.SUBTRACT)

    # M2.5 Clearance Hole4 outline → M2.5 Clearance Hole4 (cut)
    with BuildSketch(Plane(origin=(0, 0, 0), x_dir=(1, 0, 0), z_dir=(0, 1, 0))):
        with Locations((-10.16, 6.35)):
            Circle(M2_5_CLEARANCE_HOLE4_OUTLINE_R)
        with Locations((10.16, 6.35)):
            Circle(M2_5_CLEARANCE_HOLE4_OUTLINE_R)
        with Locations((10.16, -6.35)):
            Circle(M2_5_CLEARANCE_HOLE4_OUTLINE_R)
        with Locations((-10.16, -6.35)):
            Circle(M2_5_CLEARANCE_HOLE4_OUTLINE_R)
    extrude(amount=M2_5_CLEARANCE_HOLE4_DEPTH, mode=Mode.SUBTRACT)


solid = part.part
